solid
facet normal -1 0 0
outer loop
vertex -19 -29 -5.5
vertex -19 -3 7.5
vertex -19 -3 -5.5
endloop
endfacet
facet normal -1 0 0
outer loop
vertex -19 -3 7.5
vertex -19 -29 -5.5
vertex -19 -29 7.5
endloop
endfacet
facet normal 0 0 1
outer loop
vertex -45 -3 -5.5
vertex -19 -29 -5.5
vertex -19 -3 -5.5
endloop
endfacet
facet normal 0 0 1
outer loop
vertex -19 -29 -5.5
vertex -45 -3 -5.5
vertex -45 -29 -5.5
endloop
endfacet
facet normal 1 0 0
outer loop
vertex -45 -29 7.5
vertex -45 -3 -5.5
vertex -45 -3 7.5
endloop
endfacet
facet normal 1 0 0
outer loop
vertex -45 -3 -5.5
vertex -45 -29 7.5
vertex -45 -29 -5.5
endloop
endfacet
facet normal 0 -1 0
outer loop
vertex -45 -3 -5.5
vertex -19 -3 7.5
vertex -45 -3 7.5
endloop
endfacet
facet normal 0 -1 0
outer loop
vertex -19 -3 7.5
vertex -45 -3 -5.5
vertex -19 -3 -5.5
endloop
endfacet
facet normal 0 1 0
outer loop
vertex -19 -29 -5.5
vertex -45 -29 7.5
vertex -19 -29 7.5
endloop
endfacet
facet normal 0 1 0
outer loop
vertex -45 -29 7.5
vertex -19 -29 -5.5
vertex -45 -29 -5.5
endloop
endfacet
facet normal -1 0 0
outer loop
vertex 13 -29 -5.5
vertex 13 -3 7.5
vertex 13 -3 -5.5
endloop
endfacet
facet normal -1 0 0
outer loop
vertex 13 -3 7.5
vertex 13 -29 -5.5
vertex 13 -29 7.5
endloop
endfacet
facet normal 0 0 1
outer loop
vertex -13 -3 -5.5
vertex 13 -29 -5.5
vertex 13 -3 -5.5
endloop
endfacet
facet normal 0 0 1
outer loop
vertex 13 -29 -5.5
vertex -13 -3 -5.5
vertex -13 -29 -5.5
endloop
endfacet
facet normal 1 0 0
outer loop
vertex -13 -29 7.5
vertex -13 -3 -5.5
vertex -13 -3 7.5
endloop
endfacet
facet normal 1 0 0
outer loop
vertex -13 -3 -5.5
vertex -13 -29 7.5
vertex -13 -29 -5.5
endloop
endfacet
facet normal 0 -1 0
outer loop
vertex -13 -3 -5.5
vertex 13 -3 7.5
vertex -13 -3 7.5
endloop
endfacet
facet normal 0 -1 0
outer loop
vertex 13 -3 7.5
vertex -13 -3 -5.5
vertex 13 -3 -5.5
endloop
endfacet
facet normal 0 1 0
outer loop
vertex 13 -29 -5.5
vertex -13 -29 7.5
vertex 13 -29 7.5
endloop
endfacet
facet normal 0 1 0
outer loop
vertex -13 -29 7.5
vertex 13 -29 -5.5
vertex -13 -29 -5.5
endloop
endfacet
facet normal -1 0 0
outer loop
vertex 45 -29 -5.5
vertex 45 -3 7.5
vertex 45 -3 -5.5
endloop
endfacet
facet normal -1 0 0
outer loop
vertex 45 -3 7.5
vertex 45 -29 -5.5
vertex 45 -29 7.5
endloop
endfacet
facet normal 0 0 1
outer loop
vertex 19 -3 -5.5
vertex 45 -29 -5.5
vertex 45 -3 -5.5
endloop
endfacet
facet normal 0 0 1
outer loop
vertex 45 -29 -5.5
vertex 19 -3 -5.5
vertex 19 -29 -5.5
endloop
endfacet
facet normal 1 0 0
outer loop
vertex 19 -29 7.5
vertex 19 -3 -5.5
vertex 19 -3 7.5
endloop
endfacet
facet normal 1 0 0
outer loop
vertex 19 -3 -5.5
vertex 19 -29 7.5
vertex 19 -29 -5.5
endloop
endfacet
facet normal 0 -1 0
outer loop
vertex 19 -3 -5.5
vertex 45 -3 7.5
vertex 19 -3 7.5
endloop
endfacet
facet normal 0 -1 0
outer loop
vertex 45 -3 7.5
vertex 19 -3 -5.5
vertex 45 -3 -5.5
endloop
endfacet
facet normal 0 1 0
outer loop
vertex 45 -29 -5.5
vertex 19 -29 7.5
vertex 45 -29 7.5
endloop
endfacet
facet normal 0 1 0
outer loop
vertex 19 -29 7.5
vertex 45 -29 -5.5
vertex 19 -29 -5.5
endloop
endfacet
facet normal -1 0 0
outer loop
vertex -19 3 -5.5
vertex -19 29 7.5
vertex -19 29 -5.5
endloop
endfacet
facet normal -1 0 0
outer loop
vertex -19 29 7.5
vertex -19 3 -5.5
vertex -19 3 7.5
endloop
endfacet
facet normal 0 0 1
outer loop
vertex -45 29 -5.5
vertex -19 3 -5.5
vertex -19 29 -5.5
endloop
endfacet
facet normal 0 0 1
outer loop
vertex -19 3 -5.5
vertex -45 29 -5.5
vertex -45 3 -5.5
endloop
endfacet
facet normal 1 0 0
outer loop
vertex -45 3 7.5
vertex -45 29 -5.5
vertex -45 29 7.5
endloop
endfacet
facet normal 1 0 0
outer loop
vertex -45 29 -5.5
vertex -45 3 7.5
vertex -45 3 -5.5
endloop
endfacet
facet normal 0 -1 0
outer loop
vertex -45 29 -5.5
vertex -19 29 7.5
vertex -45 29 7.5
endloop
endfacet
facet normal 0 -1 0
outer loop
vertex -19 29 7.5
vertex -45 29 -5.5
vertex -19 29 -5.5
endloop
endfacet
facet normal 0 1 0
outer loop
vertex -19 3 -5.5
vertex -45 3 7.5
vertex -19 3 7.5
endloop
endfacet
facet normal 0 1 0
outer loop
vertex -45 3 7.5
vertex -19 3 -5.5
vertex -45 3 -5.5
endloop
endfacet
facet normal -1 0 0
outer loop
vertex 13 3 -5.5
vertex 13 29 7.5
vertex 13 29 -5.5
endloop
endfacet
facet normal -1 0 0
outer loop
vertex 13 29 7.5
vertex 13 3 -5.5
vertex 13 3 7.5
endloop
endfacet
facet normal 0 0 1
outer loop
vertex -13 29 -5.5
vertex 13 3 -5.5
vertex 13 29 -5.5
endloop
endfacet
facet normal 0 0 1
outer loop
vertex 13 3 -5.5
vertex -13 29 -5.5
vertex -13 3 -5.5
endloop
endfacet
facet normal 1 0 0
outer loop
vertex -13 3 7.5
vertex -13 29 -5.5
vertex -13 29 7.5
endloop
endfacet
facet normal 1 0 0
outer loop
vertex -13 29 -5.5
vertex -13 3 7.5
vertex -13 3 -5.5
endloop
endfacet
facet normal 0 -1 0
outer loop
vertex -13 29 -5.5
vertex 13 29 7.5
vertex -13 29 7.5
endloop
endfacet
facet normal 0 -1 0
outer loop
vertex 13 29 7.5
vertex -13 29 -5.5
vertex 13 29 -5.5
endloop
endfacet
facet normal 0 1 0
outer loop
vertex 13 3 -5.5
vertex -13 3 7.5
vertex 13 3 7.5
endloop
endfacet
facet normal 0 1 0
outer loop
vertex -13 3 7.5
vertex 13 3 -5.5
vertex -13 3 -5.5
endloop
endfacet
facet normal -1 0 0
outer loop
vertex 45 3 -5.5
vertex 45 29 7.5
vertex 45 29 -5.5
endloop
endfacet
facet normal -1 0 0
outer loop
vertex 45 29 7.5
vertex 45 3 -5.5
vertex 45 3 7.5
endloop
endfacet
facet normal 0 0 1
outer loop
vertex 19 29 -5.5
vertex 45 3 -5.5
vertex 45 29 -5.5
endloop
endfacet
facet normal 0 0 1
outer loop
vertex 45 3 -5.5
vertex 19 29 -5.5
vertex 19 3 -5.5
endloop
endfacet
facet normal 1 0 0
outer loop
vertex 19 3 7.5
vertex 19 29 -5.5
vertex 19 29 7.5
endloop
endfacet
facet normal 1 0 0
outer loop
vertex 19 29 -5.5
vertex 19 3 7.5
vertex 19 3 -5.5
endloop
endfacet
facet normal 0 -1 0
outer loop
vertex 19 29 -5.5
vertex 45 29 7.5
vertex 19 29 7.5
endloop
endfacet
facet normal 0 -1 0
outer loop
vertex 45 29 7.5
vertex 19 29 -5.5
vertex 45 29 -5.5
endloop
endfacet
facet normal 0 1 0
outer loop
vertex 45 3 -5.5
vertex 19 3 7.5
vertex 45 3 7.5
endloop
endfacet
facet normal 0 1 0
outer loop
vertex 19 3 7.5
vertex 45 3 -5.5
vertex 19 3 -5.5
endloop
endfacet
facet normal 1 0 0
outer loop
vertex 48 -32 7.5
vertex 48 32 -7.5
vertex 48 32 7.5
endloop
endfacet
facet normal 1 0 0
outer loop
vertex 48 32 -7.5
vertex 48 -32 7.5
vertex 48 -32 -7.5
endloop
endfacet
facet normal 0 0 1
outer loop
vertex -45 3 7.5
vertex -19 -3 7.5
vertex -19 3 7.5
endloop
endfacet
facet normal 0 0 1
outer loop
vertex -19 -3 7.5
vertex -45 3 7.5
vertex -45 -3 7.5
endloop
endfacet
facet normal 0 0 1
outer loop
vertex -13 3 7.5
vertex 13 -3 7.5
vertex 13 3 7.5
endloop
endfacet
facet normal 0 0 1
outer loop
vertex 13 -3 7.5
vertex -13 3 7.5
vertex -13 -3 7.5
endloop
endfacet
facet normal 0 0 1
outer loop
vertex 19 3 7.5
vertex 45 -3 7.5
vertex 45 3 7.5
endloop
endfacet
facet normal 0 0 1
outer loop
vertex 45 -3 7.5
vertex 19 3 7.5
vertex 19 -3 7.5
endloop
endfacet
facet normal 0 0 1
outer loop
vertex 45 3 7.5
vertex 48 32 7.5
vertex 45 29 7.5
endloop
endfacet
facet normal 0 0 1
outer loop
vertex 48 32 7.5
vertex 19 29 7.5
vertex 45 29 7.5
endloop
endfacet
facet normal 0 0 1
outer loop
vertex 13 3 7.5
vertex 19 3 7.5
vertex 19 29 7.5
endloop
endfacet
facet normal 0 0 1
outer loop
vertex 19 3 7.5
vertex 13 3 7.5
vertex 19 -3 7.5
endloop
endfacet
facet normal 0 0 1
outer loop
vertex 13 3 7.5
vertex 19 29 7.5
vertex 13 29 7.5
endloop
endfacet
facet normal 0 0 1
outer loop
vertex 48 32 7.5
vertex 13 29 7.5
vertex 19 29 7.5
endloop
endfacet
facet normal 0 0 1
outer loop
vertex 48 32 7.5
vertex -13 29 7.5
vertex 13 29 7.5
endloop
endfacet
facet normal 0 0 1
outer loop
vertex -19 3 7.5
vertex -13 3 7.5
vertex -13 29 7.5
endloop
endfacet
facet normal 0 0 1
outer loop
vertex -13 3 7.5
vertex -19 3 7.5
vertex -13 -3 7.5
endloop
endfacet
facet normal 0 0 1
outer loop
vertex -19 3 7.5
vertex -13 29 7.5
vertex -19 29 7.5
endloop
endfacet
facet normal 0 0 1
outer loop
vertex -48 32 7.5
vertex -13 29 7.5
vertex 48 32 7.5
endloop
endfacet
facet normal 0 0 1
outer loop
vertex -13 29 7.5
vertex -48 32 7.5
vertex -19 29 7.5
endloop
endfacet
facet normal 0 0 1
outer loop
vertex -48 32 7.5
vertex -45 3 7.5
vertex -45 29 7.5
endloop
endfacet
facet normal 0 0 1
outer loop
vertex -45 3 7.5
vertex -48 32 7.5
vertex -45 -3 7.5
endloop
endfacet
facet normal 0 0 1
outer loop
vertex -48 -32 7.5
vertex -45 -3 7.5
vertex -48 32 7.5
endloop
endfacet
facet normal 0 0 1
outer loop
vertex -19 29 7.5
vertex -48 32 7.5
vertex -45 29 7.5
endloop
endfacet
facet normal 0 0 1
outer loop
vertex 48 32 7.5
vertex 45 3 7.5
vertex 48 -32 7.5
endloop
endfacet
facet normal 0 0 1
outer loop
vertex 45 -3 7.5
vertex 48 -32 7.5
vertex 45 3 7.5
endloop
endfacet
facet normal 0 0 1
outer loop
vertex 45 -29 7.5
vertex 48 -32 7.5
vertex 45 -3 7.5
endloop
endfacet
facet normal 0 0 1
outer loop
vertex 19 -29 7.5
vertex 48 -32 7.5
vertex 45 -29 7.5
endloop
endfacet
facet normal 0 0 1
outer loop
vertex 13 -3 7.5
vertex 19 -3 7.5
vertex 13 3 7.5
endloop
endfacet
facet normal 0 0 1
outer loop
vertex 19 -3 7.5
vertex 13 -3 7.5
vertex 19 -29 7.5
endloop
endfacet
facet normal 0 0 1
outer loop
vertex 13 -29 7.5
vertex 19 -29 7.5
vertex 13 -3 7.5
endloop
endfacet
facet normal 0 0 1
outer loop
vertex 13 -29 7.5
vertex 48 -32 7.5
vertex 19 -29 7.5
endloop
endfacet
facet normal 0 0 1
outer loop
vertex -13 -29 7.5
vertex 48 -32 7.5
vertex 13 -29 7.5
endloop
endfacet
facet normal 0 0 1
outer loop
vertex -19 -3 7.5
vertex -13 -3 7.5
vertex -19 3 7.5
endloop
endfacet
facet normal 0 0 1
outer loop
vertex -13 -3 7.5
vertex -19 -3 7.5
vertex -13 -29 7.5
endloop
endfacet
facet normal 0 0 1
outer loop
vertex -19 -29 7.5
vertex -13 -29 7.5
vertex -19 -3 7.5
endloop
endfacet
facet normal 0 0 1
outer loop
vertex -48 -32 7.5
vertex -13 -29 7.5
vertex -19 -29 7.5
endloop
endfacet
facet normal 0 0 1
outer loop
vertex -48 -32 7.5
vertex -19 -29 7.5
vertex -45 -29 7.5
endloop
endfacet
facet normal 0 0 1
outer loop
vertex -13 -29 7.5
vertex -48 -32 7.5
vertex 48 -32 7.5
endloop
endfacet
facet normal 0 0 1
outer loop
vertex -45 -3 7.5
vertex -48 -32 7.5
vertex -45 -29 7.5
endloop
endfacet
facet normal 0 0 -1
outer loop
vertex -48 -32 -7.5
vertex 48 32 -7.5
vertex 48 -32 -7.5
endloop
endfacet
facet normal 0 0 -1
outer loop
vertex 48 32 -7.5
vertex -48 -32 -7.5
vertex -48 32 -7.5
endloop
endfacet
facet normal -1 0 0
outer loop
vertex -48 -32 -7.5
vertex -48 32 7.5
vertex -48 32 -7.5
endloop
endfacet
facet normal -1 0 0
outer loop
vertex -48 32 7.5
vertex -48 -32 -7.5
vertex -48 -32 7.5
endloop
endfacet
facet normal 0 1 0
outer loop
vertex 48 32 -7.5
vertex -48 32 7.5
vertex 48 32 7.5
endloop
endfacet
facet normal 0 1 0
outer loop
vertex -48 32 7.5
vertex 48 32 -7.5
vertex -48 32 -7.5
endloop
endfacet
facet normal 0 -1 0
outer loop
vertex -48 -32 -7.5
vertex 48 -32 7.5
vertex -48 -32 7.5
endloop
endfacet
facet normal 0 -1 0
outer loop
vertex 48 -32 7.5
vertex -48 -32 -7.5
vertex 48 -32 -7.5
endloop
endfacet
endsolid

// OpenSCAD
$fn = 32;

// ----------------------------------------------------------------------
// Pocket plate 96 x 64 x 15
// 2 x 3 pockets 26 mm square, 13 mm deep
// ----------------------------------------------------------------------

// --- parameters (mm) ---
thickness = 15;  // plate thickness
floor_t = 2;     // material left under each pocket
pocket = 26;     // pocket side length
pitch_x = 32;    // pocket pitch along X
pitch_y = 32;    // pocket pitch along Y
cols = 3;        // pockets per row
rows = 2;        // rows of pockets

// --- derived feature positions (mm) ---
depth = thickness - floor_t;        // = 13   pocket depth, down to the floor
span_x = (cols - 1) * pitch_x;      // = 64   distance between outer pockets
span_y = (rows - 1) * pitch_y;      // = 32   distance between outer pocket rows
origin_x = -span_x / 2;             // = -32   X of the first pocket
origin_y = -span_y / 2;             // = -16   Y of the first pocket
plate = [span_x + pocket + 6, span_y + pocket + 6, thickness];  // = [96, 64, 15]   overall size: pockets plus 3 mm of wall on each side
feature_centers = [
  [origin_x + 0 * pitch_x, origin_y + 0 * pitch_y],
  [origin_x + 1 * pitch_x, origin_y + 0 * pitch_y],
  [origin_x + 2 * pitch_x, origin_y + 0 * pitch_y],
  [origin_x + 0 * pitch_x, origin_y + 1 * pitch_y],
  [origin_x + 1 * pitch_x, origin_y + 1 * pitch_y],
  [origin_x + 2 * pitch_x, origin_y + 1 * pitch_y]
];   // pocket centres, used verbatim by the cutter loop

// plate outline, then one pocket per centre in feature_centers
difference() {
  cube(plate, center = true);
  for (centre = feature_centers)
    translate([centre[0] - pocket / 2, centre[1] - pocket / 2, plate[2] / 2 - depth])
      cube([pocket, pocket, depth + 1]);  // centred on the declared pocket centre
}
